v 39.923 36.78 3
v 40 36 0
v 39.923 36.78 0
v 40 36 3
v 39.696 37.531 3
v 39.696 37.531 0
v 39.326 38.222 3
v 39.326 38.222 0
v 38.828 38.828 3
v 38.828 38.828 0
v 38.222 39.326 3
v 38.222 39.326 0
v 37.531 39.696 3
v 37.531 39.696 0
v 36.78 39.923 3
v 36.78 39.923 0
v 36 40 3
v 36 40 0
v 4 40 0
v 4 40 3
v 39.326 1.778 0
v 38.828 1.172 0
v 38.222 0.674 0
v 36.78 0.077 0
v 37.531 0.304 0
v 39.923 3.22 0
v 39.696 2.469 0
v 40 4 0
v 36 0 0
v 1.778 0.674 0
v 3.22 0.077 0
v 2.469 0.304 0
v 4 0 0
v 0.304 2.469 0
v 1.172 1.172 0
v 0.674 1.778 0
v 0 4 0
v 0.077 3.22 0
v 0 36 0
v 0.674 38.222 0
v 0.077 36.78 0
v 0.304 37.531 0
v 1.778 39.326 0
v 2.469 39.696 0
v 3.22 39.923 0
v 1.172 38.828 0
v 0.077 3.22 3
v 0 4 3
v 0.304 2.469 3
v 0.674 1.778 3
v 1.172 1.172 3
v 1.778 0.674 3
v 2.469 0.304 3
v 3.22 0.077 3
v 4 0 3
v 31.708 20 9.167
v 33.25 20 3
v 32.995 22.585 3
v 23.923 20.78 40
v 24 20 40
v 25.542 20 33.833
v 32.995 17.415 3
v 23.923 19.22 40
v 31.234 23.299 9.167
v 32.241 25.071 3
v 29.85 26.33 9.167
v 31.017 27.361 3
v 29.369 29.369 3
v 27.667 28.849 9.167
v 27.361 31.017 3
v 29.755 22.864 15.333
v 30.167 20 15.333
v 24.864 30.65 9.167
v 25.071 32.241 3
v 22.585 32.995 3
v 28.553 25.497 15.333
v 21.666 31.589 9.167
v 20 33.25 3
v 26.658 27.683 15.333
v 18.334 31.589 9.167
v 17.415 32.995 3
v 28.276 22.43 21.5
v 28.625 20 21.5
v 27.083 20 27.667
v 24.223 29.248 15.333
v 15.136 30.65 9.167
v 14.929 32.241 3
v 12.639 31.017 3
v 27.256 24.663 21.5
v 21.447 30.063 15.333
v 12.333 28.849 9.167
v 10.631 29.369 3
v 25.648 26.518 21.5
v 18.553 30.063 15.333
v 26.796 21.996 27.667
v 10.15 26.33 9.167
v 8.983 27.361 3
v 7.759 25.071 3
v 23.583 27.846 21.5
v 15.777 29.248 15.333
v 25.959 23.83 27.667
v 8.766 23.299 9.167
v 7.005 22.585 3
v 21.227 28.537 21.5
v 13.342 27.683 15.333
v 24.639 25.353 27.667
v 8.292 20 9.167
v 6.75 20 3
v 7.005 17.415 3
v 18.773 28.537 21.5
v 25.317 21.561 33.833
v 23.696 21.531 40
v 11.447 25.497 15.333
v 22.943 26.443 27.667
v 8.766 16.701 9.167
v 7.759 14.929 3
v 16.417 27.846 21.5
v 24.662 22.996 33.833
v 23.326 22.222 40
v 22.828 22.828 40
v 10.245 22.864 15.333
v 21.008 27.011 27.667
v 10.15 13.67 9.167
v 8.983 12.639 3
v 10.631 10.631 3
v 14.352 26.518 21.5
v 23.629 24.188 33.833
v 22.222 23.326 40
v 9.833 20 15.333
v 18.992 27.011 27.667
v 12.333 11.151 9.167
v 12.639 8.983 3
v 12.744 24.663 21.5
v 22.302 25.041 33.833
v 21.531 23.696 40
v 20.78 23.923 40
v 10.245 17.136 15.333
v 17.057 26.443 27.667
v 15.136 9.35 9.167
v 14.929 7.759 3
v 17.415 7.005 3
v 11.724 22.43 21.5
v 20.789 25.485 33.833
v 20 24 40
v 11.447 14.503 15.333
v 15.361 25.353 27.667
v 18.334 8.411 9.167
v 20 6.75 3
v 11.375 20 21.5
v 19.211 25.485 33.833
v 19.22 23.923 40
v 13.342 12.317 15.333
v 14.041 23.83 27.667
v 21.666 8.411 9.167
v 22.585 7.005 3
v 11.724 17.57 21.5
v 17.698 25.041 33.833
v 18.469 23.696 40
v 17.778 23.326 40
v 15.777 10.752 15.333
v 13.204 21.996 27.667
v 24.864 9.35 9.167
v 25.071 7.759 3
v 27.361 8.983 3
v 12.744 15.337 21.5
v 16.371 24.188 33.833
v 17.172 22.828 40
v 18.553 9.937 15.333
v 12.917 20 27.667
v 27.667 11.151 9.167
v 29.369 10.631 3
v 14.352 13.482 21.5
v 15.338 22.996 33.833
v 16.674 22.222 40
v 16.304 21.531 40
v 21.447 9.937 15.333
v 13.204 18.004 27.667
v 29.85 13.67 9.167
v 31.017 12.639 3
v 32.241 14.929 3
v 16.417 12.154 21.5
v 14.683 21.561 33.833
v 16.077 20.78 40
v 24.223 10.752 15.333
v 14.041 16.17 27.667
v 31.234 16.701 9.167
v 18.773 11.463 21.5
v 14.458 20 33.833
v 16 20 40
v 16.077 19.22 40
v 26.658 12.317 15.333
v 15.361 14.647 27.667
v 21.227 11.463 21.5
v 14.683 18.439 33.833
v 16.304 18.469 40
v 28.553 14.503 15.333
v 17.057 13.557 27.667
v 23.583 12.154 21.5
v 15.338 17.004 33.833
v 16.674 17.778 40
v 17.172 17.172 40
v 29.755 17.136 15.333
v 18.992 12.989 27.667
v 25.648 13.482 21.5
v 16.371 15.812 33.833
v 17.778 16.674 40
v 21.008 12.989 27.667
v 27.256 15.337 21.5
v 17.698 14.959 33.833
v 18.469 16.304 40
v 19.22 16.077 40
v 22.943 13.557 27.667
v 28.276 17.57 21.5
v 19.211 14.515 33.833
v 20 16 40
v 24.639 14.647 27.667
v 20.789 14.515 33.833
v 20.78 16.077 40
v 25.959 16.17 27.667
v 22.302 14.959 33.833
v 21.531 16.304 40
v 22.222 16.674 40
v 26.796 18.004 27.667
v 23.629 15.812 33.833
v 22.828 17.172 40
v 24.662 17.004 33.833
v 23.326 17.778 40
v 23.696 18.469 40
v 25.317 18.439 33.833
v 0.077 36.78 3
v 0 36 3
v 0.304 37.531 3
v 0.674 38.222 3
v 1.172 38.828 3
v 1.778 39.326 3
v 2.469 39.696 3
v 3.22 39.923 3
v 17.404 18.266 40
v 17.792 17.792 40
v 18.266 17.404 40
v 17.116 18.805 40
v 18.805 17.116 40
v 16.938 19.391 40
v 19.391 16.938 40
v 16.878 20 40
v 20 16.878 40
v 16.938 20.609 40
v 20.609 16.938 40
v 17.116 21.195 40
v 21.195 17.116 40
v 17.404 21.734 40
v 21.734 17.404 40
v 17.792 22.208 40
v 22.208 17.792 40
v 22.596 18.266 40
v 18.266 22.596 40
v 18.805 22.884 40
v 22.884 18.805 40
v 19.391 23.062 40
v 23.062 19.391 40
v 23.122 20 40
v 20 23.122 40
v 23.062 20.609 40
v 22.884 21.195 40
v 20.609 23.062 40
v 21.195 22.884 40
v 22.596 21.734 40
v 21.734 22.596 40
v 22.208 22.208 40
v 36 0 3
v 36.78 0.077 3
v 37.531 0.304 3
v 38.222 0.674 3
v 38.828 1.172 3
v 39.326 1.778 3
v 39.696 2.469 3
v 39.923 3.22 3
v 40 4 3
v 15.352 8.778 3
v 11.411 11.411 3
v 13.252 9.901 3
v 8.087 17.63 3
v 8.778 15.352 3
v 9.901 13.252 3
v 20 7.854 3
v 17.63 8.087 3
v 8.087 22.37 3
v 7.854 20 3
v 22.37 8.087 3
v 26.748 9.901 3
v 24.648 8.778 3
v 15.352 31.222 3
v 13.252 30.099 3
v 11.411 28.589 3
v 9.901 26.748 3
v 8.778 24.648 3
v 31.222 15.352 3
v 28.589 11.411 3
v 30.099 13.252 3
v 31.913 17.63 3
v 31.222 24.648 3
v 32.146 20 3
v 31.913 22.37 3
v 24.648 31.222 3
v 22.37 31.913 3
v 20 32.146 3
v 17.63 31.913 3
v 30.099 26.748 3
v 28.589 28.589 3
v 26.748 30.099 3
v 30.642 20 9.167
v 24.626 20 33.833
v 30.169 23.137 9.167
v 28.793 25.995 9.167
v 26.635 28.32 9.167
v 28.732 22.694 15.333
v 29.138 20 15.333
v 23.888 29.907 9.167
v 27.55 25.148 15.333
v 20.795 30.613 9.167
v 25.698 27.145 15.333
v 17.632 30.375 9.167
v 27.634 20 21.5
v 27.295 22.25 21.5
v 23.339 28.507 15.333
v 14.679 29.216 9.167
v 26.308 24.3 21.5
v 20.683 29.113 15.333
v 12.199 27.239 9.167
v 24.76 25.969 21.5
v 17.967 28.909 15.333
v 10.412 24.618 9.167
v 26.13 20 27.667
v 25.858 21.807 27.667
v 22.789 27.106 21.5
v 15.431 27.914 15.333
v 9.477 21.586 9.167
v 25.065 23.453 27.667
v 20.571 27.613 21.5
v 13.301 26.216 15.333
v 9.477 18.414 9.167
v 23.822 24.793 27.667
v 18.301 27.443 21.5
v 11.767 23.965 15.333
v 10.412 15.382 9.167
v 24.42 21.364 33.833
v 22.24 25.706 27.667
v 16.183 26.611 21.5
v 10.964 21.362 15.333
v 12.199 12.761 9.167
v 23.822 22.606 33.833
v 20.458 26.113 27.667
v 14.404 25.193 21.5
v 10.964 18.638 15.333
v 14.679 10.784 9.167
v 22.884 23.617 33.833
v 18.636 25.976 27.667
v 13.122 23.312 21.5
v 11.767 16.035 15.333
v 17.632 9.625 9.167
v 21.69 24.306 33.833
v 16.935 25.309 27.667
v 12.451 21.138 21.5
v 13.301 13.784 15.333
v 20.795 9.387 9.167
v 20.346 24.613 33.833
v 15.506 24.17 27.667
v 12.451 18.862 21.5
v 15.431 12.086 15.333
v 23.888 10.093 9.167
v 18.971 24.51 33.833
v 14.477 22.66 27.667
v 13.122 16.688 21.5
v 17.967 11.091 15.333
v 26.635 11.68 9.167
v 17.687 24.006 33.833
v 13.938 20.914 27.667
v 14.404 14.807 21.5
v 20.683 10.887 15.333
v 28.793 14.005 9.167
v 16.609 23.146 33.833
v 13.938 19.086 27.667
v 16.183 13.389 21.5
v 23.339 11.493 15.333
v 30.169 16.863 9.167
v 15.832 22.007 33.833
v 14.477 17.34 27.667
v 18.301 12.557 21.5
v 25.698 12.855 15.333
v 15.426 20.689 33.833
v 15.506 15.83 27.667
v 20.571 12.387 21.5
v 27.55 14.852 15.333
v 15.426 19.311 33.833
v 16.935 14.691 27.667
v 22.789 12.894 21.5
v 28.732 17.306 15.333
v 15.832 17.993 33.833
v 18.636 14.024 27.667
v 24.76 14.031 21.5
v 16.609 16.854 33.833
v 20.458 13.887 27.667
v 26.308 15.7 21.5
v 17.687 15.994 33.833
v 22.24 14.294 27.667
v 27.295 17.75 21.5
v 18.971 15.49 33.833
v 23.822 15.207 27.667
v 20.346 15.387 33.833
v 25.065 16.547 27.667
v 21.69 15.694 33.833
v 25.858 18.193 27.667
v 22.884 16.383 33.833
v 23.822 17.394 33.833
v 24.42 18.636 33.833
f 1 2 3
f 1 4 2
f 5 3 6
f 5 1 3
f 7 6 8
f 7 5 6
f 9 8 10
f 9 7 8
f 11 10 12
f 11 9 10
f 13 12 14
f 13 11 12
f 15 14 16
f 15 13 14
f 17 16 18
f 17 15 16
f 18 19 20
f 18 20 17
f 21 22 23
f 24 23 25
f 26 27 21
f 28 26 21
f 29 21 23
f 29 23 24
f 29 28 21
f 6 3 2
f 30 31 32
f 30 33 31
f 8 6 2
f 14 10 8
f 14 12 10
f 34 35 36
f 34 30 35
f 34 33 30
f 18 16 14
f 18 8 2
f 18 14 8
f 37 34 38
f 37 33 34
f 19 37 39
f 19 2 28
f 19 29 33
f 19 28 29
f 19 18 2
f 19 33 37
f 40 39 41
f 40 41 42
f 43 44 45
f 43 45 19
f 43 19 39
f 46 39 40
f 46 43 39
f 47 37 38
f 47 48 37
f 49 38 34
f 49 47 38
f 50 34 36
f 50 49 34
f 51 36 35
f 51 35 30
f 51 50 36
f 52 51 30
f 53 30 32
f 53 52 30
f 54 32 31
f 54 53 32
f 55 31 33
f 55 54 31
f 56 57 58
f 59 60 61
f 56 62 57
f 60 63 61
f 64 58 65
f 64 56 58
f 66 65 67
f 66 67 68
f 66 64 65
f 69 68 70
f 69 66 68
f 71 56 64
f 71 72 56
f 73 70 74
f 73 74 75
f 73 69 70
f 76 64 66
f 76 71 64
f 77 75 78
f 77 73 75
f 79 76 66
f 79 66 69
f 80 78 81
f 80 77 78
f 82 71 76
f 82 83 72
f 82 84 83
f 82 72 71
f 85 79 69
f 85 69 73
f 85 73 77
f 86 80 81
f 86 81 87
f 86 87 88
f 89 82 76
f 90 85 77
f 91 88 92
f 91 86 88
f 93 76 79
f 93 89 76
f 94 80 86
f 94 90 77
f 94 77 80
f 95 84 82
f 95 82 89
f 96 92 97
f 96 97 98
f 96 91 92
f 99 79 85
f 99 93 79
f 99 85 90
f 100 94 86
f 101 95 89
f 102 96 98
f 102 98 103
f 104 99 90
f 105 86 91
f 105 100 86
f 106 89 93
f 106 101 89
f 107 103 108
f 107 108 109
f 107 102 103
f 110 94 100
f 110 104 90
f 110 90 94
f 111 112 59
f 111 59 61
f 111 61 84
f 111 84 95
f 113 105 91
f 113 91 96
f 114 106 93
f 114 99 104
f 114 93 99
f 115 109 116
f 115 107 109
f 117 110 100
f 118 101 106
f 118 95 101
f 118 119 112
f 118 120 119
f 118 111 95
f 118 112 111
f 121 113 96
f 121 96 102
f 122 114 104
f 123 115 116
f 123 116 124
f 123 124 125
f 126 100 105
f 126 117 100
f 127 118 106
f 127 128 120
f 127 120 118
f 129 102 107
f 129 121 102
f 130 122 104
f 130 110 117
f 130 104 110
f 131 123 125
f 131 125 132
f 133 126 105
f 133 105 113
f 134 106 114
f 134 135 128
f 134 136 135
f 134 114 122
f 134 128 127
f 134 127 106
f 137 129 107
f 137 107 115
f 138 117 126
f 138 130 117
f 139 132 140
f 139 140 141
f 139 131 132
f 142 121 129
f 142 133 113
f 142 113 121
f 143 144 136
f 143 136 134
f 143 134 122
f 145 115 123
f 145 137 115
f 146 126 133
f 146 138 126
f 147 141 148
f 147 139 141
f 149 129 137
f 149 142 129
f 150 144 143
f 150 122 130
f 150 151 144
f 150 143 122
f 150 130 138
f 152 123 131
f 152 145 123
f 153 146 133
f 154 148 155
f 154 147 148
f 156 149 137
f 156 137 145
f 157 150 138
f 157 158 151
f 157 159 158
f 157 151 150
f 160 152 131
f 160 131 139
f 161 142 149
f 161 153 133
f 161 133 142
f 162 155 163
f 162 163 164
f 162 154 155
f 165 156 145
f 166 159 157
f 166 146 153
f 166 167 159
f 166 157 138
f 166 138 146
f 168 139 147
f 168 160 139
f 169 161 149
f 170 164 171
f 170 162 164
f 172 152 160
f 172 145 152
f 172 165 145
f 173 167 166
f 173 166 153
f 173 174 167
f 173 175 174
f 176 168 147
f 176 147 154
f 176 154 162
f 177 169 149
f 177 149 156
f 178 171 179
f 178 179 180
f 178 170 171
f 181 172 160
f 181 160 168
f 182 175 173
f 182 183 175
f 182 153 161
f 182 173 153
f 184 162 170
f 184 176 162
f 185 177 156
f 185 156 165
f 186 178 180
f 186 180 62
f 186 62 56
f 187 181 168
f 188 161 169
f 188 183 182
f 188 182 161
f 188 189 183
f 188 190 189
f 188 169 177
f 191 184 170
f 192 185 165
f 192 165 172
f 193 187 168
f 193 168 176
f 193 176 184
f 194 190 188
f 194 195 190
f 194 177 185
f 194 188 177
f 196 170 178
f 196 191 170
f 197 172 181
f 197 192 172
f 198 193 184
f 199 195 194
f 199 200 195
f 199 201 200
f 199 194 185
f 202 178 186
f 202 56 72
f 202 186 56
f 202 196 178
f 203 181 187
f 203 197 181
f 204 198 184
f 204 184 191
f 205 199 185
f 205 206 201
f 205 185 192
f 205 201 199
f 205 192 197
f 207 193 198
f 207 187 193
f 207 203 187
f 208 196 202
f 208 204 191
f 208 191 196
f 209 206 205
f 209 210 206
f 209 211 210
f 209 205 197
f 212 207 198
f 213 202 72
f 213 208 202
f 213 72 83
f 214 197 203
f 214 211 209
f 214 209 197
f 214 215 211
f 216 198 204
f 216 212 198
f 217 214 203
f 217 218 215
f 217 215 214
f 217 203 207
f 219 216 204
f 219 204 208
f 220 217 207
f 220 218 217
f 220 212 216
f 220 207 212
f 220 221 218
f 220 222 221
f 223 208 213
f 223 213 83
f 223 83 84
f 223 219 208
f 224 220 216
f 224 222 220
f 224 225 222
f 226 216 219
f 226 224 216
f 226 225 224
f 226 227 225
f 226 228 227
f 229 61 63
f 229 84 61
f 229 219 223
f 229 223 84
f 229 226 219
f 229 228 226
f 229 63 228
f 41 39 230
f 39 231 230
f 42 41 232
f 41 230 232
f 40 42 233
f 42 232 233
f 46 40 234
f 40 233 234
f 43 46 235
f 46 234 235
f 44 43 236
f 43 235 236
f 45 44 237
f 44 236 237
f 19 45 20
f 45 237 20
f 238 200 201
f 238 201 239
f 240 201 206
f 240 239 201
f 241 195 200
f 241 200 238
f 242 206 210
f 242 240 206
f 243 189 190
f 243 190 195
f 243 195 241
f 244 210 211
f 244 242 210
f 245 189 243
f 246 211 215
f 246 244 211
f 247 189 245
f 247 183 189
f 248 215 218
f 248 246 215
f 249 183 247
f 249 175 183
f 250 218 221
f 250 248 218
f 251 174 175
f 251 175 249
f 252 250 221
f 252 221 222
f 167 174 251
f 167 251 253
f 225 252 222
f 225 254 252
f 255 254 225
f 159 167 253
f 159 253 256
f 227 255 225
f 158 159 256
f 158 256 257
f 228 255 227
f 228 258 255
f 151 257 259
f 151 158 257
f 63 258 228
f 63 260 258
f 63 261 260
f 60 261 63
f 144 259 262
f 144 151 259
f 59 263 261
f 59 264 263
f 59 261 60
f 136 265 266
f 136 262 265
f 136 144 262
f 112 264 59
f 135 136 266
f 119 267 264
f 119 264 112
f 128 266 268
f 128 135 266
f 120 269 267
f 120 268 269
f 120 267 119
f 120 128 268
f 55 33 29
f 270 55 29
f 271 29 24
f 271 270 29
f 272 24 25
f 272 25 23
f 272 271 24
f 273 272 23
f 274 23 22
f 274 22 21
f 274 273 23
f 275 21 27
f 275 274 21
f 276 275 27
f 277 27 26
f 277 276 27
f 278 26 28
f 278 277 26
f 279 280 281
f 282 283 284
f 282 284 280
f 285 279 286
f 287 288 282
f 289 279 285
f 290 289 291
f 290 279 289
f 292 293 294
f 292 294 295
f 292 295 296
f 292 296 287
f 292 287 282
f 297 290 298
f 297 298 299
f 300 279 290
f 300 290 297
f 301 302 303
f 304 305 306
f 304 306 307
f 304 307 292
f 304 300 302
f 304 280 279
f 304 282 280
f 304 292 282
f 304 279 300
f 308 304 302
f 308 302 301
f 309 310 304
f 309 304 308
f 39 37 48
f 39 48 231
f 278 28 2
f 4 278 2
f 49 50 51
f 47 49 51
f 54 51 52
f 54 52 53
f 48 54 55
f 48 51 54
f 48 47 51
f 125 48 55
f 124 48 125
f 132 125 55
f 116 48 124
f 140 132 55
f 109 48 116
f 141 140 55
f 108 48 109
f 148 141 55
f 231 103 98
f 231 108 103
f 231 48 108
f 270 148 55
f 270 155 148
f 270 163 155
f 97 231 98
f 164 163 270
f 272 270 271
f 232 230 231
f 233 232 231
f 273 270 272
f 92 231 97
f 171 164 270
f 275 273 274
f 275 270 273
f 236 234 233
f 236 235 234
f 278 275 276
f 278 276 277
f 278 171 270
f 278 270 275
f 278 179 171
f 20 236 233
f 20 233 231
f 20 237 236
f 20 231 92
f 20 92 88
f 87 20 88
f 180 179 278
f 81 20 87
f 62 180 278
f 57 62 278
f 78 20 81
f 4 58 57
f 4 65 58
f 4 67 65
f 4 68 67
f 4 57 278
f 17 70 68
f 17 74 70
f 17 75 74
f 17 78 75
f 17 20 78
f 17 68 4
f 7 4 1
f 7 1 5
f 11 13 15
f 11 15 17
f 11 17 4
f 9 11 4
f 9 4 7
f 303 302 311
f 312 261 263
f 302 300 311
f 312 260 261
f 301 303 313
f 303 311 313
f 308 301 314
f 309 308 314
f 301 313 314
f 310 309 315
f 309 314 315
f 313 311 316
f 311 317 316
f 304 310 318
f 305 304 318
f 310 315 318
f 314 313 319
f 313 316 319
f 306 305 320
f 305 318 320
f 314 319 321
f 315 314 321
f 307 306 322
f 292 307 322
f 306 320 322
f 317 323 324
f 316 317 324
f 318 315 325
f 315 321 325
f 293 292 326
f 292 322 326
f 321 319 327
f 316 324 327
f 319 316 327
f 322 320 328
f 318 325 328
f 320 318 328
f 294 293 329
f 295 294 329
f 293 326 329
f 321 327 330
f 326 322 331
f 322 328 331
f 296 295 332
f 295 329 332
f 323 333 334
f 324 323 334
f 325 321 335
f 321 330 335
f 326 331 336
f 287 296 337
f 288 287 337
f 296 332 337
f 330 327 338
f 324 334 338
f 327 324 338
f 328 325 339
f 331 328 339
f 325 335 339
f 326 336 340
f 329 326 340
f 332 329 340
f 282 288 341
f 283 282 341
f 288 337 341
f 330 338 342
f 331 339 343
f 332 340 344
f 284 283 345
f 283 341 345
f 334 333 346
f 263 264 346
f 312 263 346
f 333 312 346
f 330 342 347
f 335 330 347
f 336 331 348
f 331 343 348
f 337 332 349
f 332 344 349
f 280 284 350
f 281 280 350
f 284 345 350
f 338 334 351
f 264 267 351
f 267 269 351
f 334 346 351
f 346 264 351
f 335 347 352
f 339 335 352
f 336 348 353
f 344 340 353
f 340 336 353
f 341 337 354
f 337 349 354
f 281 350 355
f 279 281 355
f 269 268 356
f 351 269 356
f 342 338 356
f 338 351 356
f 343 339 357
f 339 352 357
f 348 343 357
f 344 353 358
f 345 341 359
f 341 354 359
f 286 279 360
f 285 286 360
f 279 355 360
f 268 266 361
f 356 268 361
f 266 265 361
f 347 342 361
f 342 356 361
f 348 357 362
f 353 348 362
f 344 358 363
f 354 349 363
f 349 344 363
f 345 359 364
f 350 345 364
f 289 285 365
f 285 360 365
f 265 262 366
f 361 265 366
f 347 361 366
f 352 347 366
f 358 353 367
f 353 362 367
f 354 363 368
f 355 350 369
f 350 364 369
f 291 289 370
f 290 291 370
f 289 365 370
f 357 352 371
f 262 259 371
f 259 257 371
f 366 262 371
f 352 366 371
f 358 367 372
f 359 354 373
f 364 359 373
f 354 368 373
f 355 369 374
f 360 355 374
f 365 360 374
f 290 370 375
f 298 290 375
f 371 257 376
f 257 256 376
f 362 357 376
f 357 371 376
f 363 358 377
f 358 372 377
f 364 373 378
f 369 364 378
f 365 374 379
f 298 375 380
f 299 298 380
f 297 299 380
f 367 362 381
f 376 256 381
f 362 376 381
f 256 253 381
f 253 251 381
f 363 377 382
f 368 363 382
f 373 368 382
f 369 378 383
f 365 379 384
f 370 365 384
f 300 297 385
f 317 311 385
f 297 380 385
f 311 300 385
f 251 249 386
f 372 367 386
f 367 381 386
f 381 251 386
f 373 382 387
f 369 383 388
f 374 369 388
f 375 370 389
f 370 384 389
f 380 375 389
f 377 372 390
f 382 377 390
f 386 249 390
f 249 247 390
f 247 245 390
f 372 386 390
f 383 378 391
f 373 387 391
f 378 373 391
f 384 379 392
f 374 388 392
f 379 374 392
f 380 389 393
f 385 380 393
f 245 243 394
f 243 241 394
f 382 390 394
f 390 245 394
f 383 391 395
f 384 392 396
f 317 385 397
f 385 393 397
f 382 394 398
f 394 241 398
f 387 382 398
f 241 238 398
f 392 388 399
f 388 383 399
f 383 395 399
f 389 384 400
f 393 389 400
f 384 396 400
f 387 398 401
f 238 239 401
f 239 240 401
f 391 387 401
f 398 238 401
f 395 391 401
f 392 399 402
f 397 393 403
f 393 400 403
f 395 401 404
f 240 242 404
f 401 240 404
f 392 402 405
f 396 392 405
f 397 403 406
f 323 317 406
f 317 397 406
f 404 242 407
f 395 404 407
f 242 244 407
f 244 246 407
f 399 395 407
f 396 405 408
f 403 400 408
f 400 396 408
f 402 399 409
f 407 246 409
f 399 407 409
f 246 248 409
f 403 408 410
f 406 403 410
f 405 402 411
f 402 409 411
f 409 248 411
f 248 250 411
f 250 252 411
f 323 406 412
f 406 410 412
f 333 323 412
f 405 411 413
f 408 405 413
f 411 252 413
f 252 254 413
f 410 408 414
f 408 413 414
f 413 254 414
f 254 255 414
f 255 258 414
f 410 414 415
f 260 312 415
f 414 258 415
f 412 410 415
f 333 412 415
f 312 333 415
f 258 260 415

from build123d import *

# Parameters (mm, degrees)
BOX_W     = 40
BOX_H     = 40
BOX_DEPTH = 3
FILLET_R  = 4


with BuildPart() as con001:
    # Cone001 → Cone001 (revolve)
    with BuildSketch(Plane(origin=(20, 20, -0.5), x_dir=(1, 0, 0), z_dir=(0, -1, 0))):
        Polygon((0, 0), (13, 0), (3, 41), (0, 41), align=None)
    revolve(axis=Axis((20, 20, -0.5), (0, 0, 1)))


with BuildPart() as cut:
    # Cone → Cone (revolve)
    with BuildSketch(Plane(origin=(20, 20, 0), x_dir=(1, 0, 0), z_dir=(0, -1, 0))):
        Polygon((0, 0), (14, 0), (4, 40), (0, 40), align=None)
    revolve(axis=Axis((20, 20, 0), (0, 0, 1)))

    # Cut: cut Con001
    add(con001.part, mode=Mode.SUBTRACT)


with BuildPart() as fusion:
    # Box → Box (new body)
    with BuildSketch(Plane.XY):
        with Locations((20, 20)):
            Rectangle(BOX_W, BOX_H)
    extrude(amount=BOX_DEPTH)

    # Fillet
    fillet_edges = [fusion.edges().sort_by_distance(p)[0] for p in [
        (0, 0, 1.5),
        (0, 40, 1.5),
        (40, 0, 1.5),
        (40, 40, 1.5),
    ]]
    fillet(fillet_edges, radius=FILLET_R)

    # Fusion: union Cut
    add(cut.part)


solid = fusion.part
